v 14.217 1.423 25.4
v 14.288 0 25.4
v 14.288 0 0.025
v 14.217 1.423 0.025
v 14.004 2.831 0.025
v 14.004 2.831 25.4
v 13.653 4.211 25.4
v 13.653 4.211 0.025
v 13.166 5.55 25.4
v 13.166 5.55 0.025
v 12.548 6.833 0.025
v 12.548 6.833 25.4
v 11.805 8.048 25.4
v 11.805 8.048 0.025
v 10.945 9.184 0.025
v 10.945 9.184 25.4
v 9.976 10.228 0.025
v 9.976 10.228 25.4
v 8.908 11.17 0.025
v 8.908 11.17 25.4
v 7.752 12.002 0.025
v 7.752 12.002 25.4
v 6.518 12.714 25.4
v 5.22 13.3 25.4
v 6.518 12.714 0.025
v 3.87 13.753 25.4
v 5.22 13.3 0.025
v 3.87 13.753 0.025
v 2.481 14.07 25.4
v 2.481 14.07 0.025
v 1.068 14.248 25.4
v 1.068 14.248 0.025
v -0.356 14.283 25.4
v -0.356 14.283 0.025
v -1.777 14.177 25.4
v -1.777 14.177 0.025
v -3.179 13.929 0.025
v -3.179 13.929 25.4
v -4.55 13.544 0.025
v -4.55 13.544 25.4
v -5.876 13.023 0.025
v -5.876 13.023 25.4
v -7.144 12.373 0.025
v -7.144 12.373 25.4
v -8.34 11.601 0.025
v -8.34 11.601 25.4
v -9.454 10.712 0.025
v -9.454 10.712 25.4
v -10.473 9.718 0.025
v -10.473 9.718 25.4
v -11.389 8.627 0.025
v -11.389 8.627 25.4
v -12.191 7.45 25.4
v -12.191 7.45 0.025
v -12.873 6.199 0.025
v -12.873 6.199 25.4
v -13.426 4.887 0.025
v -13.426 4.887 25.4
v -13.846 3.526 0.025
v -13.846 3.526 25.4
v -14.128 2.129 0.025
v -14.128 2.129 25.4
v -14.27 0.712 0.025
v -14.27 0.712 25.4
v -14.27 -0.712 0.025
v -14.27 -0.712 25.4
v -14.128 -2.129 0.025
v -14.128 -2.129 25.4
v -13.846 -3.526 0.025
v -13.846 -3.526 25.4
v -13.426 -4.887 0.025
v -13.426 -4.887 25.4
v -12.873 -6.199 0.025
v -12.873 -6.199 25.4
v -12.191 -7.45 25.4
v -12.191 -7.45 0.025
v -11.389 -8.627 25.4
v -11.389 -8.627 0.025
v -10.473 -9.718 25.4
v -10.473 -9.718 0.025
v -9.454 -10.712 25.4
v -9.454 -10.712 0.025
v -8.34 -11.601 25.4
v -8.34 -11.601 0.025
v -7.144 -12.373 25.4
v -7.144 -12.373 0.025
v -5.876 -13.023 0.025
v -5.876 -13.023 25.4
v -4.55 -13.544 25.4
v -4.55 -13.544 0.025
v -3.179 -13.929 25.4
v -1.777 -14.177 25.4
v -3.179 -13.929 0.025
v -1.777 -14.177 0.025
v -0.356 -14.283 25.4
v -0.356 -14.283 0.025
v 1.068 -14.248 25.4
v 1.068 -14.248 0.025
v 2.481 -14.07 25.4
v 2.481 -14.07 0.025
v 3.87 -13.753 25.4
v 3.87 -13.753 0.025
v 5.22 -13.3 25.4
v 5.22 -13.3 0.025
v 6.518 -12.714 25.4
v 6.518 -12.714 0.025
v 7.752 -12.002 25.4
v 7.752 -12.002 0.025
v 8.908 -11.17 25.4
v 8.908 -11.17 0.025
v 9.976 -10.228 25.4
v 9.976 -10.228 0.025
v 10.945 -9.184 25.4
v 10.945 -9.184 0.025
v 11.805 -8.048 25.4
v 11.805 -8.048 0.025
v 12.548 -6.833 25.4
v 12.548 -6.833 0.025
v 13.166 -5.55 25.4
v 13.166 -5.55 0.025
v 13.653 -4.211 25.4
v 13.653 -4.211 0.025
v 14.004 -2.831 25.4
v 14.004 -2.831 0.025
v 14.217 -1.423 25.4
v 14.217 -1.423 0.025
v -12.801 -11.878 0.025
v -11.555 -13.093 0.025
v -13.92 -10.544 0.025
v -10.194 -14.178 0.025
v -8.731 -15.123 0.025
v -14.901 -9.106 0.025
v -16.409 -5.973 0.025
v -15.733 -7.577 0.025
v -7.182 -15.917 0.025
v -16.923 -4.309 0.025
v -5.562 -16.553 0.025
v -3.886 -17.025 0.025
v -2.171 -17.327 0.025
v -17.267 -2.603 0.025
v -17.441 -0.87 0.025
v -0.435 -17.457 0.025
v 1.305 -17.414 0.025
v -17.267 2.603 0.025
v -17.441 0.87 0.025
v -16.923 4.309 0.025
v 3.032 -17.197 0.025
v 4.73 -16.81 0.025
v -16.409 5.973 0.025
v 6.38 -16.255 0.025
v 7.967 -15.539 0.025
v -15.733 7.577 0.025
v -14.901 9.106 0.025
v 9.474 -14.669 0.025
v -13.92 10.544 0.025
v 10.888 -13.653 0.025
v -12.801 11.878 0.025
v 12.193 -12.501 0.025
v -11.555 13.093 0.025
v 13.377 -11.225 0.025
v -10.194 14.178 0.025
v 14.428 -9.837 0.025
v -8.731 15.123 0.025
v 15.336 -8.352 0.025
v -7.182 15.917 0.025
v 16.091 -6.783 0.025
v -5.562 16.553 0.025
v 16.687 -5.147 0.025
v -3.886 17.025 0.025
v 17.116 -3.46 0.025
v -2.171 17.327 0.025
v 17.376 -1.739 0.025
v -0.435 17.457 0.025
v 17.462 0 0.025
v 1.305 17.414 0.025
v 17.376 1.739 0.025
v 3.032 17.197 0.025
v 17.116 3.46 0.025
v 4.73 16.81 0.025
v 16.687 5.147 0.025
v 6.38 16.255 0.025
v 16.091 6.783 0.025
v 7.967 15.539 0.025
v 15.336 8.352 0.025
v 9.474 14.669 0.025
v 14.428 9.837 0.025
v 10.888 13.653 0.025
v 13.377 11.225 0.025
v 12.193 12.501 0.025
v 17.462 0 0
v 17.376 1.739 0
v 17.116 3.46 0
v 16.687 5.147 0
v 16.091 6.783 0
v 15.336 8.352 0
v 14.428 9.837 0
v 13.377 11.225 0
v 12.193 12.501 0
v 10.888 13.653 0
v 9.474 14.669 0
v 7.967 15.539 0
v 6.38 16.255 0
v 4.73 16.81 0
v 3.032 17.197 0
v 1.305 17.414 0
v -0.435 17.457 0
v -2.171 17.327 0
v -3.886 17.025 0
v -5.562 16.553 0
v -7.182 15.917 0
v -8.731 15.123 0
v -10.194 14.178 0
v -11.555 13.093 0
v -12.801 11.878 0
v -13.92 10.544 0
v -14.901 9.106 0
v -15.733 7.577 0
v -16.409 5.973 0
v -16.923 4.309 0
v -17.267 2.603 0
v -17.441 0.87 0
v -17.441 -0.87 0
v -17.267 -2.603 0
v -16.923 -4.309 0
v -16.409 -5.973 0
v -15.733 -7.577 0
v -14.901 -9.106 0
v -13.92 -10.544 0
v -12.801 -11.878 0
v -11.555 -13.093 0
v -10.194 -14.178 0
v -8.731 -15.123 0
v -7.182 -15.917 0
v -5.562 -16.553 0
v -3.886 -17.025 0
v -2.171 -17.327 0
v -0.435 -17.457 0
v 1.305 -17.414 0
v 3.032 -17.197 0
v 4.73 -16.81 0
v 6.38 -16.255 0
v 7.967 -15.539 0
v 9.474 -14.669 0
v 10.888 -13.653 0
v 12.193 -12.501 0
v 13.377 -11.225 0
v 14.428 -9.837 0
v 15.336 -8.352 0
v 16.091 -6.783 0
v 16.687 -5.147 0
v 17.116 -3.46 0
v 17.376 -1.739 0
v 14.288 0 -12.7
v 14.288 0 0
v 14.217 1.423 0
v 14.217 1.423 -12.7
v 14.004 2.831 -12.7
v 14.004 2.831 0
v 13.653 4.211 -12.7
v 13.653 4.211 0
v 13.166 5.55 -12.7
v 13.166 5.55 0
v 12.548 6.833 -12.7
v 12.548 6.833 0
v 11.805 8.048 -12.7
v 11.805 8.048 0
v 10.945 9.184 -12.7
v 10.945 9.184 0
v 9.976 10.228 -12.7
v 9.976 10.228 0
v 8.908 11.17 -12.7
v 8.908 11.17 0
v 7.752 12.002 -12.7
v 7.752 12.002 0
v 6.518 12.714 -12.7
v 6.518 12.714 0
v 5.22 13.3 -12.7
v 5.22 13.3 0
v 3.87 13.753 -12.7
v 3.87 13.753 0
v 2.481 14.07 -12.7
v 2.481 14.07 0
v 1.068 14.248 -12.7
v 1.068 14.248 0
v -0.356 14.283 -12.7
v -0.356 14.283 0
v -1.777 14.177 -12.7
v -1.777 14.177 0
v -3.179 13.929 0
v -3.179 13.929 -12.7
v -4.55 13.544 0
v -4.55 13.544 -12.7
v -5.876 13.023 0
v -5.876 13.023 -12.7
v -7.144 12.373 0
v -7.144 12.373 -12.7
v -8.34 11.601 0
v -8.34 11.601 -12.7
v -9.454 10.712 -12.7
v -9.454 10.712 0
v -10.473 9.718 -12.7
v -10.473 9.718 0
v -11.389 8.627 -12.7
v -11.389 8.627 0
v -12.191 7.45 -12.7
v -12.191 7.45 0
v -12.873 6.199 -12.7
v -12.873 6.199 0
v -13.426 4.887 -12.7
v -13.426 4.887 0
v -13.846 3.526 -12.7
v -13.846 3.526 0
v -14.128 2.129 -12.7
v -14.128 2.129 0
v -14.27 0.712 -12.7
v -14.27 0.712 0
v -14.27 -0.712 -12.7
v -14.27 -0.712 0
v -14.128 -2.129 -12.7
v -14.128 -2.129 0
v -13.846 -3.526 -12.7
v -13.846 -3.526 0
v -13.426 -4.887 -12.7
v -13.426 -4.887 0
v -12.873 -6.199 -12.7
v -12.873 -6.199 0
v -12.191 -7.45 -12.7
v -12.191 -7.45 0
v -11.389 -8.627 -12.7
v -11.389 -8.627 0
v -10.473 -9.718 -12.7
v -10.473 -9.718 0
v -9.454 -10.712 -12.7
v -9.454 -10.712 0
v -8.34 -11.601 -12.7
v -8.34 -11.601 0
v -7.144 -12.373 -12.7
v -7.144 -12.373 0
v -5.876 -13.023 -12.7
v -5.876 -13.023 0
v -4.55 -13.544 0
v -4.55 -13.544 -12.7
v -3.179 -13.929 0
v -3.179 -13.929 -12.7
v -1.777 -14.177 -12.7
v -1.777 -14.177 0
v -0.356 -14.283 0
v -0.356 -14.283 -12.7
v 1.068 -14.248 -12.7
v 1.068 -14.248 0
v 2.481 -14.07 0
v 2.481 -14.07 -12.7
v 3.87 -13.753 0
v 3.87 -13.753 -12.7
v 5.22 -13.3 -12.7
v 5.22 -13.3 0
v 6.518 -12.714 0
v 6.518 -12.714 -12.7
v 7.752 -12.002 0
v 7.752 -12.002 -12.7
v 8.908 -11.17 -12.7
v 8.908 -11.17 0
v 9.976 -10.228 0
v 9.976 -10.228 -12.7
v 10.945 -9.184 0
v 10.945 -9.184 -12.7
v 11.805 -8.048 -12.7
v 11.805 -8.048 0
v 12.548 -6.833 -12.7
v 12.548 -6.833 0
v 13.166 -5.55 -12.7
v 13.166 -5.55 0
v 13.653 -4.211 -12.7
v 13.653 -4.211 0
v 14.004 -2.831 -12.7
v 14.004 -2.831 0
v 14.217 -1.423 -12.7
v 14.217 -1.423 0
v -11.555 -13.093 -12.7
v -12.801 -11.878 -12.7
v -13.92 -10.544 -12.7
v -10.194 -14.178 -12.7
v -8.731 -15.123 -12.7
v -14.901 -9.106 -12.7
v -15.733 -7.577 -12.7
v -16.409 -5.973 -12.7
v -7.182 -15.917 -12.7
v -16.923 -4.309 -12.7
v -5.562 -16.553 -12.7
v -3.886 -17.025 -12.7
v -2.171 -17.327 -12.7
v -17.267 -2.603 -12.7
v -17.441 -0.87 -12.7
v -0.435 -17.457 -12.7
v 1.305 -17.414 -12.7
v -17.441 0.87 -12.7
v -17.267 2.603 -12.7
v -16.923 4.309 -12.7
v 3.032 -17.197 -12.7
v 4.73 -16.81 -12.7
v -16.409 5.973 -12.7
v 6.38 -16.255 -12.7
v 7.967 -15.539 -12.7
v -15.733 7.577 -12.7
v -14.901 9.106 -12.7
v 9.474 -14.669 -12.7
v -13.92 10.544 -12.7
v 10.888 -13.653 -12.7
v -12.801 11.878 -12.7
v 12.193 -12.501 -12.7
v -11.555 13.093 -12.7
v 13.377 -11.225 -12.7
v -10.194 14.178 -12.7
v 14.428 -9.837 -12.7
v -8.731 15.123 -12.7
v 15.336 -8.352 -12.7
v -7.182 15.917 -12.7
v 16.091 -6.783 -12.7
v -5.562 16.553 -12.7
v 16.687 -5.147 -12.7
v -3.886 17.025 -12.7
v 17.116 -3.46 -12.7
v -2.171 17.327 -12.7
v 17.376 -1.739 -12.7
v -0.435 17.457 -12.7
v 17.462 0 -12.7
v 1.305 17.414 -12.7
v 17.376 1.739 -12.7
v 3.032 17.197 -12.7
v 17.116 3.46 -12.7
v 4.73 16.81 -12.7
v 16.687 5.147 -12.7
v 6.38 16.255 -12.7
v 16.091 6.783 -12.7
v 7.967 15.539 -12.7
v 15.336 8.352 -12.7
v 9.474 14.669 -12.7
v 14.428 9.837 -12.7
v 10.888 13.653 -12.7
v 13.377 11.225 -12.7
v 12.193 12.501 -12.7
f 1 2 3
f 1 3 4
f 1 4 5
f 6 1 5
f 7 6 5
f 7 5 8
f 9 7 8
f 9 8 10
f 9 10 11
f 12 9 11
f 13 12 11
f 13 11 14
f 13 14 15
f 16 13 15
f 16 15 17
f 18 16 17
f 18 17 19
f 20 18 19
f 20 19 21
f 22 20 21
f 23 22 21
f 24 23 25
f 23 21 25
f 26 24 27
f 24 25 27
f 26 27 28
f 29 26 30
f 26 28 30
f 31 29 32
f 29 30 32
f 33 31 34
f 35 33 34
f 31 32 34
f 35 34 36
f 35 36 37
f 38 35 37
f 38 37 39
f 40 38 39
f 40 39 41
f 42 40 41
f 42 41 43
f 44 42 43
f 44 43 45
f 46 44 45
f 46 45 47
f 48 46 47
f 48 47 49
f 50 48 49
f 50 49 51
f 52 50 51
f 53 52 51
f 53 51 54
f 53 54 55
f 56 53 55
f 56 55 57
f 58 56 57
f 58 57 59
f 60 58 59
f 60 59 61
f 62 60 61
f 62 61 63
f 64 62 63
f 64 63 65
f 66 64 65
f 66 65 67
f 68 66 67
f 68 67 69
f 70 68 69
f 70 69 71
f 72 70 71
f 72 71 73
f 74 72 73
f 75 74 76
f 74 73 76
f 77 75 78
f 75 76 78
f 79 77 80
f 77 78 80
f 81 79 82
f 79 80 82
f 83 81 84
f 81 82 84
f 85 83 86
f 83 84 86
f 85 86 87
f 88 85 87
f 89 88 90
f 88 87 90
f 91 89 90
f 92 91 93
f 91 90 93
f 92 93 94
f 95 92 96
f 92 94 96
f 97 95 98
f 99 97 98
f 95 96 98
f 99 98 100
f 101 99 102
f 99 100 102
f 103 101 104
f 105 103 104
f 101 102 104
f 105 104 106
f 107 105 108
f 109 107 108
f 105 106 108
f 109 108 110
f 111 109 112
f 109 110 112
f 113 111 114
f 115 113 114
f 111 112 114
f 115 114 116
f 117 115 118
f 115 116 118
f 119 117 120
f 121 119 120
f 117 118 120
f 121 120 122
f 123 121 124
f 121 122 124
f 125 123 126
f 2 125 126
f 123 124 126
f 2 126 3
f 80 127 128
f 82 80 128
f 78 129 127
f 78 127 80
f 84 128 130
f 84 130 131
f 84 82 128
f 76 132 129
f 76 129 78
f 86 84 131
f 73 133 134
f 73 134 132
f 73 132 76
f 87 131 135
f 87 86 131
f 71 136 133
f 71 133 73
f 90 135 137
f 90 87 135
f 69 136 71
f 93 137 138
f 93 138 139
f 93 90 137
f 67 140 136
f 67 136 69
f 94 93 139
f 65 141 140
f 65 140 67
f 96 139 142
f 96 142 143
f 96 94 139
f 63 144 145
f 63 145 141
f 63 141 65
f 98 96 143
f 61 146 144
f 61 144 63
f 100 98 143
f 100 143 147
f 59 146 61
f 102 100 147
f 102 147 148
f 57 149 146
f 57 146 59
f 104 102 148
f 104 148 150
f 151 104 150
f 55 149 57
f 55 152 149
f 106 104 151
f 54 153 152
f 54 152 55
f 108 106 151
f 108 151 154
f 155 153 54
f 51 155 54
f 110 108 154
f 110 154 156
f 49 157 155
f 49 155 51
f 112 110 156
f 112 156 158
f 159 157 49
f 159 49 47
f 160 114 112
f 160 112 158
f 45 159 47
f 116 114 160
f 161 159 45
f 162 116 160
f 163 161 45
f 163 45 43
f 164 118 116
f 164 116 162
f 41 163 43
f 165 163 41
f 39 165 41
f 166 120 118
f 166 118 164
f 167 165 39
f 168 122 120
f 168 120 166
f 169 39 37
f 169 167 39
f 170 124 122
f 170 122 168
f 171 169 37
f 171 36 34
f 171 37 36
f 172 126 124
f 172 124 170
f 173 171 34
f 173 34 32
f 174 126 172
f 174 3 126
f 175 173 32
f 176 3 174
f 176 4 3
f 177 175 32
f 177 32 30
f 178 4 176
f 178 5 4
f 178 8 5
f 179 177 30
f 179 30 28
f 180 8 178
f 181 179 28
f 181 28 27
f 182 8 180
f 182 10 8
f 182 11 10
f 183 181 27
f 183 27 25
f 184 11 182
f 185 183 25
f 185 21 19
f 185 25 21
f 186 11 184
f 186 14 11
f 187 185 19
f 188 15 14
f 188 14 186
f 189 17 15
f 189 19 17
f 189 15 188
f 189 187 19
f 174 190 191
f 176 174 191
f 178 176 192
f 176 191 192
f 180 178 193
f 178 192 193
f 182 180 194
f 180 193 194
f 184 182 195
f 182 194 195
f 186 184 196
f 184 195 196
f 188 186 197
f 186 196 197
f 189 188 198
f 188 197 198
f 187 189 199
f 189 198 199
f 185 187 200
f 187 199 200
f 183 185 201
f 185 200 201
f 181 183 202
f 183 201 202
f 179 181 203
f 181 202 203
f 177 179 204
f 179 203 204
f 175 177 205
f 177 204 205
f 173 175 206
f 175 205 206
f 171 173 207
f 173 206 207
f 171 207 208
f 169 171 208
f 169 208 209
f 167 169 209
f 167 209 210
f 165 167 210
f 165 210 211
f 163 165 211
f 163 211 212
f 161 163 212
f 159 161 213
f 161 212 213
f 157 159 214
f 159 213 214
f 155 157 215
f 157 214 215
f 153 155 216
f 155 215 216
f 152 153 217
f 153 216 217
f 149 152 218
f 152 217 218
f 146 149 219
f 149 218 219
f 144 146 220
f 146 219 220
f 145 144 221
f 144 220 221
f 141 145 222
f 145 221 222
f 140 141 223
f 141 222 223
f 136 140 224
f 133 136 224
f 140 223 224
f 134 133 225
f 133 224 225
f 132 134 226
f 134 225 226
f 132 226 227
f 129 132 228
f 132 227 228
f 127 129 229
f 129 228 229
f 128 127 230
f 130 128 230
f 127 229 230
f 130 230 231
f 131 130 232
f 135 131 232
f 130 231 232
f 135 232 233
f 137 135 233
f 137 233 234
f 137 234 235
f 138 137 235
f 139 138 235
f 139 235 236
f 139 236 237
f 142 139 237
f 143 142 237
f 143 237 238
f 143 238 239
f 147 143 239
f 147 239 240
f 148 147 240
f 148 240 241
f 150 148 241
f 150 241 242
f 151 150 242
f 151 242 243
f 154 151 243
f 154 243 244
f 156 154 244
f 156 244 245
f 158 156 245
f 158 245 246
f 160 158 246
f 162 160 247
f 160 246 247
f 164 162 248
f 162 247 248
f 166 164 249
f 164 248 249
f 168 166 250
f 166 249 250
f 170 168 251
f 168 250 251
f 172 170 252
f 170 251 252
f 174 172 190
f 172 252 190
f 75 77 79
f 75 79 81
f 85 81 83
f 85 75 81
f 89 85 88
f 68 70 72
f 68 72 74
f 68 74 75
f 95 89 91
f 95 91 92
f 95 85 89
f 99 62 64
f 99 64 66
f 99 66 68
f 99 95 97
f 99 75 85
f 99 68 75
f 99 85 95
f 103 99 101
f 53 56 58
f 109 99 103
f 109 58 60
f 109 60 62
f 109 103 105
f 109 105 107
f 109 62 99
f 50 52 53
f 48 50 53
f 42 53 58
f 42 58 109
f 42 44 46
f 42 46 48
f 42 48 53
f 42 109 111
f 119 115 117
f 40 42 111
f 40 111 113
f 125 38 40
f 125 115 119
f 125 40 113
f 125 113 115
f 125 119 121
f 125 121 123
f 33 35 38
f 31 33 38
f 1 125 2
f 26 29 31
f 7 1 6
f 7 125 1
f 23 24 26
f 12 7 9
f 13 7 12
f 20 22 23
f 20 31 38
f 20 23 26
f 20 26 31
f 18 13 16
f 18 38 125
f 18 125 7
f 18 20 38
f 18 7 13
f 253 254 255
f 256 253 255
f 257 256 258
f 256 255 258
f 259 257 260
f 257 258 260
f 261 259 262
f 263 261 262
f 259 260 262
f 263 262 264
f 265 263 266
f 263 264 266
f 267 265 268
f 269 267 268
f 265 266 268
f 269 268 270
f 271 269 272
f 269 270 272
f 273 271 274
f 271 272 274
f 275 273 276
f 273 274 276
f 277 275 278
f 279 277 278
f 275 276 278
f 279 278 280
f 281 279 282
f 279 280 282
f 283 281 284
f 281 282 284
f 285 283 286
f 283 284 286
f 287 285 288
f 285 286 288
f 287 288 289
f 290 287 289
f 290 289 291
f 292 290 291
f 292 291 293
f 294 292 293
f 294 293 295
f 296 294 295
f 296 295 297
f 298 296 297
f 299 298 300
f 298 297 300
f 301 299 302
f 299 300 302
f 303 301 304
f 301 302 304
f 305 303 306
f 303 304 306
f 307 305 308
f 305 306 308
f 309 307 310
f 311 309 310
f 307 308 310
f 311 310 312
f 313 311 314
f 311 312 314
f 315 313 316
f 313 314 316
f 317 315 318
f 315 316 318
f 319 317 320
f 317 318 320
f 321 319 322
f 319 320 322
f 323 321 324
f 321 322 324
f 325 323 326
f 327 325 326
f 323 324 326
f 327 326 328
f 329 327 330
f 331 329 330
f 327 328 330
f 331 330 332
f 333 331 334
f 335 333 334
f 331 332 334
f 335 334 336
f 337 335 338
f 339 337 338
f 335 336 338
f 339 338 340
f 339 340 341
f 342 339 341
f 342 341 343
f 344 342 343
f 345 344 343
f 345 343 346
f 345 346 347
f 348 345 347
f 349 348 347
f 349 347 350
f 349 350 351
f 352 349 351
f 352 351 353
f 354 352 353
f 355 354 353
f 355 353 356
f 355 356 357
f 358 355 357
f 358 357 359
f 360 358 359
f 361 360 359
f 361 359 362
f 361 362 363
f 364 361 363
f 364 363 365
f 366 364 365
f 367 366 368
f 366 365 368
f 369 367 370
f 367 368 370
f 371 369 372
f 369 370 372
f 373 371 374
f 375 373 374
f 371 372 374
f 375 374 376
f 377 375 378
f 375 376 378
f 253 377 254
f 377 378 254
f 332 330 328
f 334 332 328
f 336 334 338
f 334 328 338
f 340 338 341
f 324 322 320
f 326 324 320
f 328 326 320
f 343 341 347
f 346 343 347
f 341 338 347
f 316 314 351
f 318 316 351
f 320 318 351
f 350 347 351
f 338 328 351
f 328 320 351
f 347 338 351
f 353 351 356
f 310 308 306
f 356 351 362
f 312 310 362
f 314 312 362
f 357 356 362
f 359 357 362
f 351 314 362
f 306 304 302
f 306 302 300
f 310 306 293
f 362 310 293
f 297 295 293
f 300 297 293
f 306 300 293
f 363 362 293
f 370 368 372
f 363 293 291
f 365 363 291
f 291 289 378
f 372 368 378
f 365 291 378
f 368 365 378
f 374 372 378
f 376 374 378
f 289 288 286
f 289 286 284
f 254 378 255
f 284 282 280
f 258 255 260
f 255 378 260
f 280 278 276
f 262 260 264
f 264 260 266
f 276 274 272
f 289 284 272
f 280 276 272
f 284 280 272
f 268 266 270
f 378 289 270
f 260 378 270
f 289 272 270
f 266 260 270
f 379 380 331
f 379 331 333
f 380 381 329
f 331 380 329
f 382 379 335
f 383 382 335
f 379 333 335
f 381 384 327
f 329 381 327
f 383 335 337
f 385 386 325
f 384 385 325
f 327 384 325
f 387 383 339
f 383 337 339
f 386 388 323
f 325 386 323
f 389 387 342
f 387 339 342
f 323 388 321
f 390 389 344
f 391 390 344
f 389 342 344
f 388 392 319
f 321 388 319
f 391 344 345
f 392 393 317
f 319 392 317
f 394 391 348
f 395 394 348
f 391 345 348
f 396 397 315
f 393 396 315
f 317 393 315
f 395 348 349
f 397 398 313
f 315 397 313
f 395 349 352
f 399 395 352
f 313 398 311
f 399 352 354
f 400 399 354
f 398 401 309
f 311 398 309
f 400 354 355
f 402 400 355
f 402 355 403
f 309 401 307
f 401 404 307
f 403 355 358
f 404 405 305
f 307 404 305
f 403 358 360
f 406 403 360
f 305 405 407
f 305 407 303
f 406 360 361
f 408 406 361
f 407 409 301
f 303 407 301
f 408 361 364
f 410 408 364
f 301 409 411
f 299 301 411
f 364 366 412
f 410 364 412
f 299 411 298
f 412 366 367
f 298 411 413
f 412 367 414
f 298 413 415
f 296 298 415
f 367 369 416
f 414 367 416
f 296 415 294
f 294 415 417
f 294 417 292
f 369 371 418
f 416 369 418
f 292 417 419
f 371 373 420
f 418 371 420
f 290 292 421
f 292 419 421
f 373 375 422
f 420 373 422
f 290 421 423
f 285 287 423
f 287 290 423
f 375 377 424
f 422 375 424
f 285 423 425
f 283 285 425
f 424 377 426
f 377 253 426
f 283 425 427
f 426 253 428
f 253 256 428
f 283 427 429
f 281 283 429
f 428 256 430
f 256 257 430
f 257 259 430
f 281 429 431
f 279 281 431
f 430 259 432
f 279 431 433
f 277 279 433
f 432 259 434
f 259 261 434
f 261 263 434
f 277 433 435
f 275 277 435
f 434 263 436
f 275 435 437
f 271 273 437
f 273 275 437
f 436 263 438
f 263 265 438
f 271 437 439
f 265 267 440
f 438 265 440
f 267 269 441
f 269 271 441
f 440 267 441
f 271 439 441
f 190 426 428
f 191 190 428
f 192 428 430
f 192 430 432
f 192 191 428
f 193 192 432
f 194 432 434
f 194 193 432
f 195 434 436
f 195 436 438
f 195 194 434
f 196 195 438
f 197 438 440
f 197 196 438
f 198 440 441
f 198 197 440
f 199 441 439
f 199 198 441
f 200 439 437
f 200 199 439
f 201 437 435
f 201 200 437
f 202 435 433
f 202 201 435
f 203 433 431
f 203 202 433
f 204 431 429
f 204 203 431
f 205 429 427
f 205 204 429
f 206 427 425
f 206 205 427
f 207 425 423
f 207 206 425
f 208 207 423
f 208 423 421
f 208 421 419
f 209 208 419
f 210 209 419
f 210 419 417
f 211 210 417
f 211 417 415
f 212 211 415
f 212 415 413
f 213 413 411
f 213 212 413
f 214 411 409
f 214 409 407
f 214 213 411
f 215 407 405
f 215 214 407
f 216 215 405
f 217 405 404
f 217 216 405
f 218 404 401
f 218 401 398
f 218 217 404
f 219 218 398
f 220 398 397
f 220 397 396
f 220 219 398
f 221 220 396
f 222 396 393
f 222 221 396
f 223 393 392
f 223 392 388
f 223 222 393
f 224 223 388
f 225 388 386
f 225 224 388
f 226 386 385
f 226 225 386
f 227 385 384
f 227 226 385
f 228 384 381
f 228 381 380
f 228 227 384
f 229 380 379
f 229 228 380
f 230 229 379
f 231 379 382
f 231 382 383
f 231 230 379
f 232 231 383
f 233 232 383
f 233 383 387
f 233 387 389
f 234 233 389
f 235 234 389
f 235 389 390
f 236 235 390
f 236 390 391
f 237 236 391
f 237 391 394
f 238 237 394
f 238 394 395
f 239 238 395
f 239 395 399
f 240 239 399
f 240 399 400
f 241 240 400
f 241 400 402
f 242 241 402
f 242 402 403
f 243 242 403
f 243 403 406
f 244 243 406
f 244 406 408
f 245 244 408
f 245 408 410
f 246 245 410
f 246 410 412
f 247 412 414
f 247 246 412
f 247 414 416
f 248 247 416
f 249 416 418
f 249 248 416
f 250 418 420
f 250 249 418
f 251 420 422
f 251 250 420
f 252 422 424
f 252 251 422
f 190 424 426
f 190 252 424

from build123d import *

# Parameters (mm, degrees)
F0_R          = 14.2875
F1_DEPTH      = 25.4
F0_R_2        = 17.4625
F2_DEPTH      = 12.7
F2_DEPTH_BACK = 0.0254


with BuildPart() as f1:
    # F0 (on Top) → F1 (new body)
    with BuildSketch(Plane.XY):
        Circle(F0_R)
    extrude(amount=F1_DEPTH)

    # F0 (on Top) → F2 (join, two sides)
    with BuildSketch(Plane.XY) as f2_sk:
        Circle(F0_R_2)
        Circle(F0_R, mode=Mode.SUBTRACT)
    extrude(amount=-F2_DEPTH)
    extrude(f2_sk.sketch, amount=F2_DEPTH_BACK)


solid = f1.part
